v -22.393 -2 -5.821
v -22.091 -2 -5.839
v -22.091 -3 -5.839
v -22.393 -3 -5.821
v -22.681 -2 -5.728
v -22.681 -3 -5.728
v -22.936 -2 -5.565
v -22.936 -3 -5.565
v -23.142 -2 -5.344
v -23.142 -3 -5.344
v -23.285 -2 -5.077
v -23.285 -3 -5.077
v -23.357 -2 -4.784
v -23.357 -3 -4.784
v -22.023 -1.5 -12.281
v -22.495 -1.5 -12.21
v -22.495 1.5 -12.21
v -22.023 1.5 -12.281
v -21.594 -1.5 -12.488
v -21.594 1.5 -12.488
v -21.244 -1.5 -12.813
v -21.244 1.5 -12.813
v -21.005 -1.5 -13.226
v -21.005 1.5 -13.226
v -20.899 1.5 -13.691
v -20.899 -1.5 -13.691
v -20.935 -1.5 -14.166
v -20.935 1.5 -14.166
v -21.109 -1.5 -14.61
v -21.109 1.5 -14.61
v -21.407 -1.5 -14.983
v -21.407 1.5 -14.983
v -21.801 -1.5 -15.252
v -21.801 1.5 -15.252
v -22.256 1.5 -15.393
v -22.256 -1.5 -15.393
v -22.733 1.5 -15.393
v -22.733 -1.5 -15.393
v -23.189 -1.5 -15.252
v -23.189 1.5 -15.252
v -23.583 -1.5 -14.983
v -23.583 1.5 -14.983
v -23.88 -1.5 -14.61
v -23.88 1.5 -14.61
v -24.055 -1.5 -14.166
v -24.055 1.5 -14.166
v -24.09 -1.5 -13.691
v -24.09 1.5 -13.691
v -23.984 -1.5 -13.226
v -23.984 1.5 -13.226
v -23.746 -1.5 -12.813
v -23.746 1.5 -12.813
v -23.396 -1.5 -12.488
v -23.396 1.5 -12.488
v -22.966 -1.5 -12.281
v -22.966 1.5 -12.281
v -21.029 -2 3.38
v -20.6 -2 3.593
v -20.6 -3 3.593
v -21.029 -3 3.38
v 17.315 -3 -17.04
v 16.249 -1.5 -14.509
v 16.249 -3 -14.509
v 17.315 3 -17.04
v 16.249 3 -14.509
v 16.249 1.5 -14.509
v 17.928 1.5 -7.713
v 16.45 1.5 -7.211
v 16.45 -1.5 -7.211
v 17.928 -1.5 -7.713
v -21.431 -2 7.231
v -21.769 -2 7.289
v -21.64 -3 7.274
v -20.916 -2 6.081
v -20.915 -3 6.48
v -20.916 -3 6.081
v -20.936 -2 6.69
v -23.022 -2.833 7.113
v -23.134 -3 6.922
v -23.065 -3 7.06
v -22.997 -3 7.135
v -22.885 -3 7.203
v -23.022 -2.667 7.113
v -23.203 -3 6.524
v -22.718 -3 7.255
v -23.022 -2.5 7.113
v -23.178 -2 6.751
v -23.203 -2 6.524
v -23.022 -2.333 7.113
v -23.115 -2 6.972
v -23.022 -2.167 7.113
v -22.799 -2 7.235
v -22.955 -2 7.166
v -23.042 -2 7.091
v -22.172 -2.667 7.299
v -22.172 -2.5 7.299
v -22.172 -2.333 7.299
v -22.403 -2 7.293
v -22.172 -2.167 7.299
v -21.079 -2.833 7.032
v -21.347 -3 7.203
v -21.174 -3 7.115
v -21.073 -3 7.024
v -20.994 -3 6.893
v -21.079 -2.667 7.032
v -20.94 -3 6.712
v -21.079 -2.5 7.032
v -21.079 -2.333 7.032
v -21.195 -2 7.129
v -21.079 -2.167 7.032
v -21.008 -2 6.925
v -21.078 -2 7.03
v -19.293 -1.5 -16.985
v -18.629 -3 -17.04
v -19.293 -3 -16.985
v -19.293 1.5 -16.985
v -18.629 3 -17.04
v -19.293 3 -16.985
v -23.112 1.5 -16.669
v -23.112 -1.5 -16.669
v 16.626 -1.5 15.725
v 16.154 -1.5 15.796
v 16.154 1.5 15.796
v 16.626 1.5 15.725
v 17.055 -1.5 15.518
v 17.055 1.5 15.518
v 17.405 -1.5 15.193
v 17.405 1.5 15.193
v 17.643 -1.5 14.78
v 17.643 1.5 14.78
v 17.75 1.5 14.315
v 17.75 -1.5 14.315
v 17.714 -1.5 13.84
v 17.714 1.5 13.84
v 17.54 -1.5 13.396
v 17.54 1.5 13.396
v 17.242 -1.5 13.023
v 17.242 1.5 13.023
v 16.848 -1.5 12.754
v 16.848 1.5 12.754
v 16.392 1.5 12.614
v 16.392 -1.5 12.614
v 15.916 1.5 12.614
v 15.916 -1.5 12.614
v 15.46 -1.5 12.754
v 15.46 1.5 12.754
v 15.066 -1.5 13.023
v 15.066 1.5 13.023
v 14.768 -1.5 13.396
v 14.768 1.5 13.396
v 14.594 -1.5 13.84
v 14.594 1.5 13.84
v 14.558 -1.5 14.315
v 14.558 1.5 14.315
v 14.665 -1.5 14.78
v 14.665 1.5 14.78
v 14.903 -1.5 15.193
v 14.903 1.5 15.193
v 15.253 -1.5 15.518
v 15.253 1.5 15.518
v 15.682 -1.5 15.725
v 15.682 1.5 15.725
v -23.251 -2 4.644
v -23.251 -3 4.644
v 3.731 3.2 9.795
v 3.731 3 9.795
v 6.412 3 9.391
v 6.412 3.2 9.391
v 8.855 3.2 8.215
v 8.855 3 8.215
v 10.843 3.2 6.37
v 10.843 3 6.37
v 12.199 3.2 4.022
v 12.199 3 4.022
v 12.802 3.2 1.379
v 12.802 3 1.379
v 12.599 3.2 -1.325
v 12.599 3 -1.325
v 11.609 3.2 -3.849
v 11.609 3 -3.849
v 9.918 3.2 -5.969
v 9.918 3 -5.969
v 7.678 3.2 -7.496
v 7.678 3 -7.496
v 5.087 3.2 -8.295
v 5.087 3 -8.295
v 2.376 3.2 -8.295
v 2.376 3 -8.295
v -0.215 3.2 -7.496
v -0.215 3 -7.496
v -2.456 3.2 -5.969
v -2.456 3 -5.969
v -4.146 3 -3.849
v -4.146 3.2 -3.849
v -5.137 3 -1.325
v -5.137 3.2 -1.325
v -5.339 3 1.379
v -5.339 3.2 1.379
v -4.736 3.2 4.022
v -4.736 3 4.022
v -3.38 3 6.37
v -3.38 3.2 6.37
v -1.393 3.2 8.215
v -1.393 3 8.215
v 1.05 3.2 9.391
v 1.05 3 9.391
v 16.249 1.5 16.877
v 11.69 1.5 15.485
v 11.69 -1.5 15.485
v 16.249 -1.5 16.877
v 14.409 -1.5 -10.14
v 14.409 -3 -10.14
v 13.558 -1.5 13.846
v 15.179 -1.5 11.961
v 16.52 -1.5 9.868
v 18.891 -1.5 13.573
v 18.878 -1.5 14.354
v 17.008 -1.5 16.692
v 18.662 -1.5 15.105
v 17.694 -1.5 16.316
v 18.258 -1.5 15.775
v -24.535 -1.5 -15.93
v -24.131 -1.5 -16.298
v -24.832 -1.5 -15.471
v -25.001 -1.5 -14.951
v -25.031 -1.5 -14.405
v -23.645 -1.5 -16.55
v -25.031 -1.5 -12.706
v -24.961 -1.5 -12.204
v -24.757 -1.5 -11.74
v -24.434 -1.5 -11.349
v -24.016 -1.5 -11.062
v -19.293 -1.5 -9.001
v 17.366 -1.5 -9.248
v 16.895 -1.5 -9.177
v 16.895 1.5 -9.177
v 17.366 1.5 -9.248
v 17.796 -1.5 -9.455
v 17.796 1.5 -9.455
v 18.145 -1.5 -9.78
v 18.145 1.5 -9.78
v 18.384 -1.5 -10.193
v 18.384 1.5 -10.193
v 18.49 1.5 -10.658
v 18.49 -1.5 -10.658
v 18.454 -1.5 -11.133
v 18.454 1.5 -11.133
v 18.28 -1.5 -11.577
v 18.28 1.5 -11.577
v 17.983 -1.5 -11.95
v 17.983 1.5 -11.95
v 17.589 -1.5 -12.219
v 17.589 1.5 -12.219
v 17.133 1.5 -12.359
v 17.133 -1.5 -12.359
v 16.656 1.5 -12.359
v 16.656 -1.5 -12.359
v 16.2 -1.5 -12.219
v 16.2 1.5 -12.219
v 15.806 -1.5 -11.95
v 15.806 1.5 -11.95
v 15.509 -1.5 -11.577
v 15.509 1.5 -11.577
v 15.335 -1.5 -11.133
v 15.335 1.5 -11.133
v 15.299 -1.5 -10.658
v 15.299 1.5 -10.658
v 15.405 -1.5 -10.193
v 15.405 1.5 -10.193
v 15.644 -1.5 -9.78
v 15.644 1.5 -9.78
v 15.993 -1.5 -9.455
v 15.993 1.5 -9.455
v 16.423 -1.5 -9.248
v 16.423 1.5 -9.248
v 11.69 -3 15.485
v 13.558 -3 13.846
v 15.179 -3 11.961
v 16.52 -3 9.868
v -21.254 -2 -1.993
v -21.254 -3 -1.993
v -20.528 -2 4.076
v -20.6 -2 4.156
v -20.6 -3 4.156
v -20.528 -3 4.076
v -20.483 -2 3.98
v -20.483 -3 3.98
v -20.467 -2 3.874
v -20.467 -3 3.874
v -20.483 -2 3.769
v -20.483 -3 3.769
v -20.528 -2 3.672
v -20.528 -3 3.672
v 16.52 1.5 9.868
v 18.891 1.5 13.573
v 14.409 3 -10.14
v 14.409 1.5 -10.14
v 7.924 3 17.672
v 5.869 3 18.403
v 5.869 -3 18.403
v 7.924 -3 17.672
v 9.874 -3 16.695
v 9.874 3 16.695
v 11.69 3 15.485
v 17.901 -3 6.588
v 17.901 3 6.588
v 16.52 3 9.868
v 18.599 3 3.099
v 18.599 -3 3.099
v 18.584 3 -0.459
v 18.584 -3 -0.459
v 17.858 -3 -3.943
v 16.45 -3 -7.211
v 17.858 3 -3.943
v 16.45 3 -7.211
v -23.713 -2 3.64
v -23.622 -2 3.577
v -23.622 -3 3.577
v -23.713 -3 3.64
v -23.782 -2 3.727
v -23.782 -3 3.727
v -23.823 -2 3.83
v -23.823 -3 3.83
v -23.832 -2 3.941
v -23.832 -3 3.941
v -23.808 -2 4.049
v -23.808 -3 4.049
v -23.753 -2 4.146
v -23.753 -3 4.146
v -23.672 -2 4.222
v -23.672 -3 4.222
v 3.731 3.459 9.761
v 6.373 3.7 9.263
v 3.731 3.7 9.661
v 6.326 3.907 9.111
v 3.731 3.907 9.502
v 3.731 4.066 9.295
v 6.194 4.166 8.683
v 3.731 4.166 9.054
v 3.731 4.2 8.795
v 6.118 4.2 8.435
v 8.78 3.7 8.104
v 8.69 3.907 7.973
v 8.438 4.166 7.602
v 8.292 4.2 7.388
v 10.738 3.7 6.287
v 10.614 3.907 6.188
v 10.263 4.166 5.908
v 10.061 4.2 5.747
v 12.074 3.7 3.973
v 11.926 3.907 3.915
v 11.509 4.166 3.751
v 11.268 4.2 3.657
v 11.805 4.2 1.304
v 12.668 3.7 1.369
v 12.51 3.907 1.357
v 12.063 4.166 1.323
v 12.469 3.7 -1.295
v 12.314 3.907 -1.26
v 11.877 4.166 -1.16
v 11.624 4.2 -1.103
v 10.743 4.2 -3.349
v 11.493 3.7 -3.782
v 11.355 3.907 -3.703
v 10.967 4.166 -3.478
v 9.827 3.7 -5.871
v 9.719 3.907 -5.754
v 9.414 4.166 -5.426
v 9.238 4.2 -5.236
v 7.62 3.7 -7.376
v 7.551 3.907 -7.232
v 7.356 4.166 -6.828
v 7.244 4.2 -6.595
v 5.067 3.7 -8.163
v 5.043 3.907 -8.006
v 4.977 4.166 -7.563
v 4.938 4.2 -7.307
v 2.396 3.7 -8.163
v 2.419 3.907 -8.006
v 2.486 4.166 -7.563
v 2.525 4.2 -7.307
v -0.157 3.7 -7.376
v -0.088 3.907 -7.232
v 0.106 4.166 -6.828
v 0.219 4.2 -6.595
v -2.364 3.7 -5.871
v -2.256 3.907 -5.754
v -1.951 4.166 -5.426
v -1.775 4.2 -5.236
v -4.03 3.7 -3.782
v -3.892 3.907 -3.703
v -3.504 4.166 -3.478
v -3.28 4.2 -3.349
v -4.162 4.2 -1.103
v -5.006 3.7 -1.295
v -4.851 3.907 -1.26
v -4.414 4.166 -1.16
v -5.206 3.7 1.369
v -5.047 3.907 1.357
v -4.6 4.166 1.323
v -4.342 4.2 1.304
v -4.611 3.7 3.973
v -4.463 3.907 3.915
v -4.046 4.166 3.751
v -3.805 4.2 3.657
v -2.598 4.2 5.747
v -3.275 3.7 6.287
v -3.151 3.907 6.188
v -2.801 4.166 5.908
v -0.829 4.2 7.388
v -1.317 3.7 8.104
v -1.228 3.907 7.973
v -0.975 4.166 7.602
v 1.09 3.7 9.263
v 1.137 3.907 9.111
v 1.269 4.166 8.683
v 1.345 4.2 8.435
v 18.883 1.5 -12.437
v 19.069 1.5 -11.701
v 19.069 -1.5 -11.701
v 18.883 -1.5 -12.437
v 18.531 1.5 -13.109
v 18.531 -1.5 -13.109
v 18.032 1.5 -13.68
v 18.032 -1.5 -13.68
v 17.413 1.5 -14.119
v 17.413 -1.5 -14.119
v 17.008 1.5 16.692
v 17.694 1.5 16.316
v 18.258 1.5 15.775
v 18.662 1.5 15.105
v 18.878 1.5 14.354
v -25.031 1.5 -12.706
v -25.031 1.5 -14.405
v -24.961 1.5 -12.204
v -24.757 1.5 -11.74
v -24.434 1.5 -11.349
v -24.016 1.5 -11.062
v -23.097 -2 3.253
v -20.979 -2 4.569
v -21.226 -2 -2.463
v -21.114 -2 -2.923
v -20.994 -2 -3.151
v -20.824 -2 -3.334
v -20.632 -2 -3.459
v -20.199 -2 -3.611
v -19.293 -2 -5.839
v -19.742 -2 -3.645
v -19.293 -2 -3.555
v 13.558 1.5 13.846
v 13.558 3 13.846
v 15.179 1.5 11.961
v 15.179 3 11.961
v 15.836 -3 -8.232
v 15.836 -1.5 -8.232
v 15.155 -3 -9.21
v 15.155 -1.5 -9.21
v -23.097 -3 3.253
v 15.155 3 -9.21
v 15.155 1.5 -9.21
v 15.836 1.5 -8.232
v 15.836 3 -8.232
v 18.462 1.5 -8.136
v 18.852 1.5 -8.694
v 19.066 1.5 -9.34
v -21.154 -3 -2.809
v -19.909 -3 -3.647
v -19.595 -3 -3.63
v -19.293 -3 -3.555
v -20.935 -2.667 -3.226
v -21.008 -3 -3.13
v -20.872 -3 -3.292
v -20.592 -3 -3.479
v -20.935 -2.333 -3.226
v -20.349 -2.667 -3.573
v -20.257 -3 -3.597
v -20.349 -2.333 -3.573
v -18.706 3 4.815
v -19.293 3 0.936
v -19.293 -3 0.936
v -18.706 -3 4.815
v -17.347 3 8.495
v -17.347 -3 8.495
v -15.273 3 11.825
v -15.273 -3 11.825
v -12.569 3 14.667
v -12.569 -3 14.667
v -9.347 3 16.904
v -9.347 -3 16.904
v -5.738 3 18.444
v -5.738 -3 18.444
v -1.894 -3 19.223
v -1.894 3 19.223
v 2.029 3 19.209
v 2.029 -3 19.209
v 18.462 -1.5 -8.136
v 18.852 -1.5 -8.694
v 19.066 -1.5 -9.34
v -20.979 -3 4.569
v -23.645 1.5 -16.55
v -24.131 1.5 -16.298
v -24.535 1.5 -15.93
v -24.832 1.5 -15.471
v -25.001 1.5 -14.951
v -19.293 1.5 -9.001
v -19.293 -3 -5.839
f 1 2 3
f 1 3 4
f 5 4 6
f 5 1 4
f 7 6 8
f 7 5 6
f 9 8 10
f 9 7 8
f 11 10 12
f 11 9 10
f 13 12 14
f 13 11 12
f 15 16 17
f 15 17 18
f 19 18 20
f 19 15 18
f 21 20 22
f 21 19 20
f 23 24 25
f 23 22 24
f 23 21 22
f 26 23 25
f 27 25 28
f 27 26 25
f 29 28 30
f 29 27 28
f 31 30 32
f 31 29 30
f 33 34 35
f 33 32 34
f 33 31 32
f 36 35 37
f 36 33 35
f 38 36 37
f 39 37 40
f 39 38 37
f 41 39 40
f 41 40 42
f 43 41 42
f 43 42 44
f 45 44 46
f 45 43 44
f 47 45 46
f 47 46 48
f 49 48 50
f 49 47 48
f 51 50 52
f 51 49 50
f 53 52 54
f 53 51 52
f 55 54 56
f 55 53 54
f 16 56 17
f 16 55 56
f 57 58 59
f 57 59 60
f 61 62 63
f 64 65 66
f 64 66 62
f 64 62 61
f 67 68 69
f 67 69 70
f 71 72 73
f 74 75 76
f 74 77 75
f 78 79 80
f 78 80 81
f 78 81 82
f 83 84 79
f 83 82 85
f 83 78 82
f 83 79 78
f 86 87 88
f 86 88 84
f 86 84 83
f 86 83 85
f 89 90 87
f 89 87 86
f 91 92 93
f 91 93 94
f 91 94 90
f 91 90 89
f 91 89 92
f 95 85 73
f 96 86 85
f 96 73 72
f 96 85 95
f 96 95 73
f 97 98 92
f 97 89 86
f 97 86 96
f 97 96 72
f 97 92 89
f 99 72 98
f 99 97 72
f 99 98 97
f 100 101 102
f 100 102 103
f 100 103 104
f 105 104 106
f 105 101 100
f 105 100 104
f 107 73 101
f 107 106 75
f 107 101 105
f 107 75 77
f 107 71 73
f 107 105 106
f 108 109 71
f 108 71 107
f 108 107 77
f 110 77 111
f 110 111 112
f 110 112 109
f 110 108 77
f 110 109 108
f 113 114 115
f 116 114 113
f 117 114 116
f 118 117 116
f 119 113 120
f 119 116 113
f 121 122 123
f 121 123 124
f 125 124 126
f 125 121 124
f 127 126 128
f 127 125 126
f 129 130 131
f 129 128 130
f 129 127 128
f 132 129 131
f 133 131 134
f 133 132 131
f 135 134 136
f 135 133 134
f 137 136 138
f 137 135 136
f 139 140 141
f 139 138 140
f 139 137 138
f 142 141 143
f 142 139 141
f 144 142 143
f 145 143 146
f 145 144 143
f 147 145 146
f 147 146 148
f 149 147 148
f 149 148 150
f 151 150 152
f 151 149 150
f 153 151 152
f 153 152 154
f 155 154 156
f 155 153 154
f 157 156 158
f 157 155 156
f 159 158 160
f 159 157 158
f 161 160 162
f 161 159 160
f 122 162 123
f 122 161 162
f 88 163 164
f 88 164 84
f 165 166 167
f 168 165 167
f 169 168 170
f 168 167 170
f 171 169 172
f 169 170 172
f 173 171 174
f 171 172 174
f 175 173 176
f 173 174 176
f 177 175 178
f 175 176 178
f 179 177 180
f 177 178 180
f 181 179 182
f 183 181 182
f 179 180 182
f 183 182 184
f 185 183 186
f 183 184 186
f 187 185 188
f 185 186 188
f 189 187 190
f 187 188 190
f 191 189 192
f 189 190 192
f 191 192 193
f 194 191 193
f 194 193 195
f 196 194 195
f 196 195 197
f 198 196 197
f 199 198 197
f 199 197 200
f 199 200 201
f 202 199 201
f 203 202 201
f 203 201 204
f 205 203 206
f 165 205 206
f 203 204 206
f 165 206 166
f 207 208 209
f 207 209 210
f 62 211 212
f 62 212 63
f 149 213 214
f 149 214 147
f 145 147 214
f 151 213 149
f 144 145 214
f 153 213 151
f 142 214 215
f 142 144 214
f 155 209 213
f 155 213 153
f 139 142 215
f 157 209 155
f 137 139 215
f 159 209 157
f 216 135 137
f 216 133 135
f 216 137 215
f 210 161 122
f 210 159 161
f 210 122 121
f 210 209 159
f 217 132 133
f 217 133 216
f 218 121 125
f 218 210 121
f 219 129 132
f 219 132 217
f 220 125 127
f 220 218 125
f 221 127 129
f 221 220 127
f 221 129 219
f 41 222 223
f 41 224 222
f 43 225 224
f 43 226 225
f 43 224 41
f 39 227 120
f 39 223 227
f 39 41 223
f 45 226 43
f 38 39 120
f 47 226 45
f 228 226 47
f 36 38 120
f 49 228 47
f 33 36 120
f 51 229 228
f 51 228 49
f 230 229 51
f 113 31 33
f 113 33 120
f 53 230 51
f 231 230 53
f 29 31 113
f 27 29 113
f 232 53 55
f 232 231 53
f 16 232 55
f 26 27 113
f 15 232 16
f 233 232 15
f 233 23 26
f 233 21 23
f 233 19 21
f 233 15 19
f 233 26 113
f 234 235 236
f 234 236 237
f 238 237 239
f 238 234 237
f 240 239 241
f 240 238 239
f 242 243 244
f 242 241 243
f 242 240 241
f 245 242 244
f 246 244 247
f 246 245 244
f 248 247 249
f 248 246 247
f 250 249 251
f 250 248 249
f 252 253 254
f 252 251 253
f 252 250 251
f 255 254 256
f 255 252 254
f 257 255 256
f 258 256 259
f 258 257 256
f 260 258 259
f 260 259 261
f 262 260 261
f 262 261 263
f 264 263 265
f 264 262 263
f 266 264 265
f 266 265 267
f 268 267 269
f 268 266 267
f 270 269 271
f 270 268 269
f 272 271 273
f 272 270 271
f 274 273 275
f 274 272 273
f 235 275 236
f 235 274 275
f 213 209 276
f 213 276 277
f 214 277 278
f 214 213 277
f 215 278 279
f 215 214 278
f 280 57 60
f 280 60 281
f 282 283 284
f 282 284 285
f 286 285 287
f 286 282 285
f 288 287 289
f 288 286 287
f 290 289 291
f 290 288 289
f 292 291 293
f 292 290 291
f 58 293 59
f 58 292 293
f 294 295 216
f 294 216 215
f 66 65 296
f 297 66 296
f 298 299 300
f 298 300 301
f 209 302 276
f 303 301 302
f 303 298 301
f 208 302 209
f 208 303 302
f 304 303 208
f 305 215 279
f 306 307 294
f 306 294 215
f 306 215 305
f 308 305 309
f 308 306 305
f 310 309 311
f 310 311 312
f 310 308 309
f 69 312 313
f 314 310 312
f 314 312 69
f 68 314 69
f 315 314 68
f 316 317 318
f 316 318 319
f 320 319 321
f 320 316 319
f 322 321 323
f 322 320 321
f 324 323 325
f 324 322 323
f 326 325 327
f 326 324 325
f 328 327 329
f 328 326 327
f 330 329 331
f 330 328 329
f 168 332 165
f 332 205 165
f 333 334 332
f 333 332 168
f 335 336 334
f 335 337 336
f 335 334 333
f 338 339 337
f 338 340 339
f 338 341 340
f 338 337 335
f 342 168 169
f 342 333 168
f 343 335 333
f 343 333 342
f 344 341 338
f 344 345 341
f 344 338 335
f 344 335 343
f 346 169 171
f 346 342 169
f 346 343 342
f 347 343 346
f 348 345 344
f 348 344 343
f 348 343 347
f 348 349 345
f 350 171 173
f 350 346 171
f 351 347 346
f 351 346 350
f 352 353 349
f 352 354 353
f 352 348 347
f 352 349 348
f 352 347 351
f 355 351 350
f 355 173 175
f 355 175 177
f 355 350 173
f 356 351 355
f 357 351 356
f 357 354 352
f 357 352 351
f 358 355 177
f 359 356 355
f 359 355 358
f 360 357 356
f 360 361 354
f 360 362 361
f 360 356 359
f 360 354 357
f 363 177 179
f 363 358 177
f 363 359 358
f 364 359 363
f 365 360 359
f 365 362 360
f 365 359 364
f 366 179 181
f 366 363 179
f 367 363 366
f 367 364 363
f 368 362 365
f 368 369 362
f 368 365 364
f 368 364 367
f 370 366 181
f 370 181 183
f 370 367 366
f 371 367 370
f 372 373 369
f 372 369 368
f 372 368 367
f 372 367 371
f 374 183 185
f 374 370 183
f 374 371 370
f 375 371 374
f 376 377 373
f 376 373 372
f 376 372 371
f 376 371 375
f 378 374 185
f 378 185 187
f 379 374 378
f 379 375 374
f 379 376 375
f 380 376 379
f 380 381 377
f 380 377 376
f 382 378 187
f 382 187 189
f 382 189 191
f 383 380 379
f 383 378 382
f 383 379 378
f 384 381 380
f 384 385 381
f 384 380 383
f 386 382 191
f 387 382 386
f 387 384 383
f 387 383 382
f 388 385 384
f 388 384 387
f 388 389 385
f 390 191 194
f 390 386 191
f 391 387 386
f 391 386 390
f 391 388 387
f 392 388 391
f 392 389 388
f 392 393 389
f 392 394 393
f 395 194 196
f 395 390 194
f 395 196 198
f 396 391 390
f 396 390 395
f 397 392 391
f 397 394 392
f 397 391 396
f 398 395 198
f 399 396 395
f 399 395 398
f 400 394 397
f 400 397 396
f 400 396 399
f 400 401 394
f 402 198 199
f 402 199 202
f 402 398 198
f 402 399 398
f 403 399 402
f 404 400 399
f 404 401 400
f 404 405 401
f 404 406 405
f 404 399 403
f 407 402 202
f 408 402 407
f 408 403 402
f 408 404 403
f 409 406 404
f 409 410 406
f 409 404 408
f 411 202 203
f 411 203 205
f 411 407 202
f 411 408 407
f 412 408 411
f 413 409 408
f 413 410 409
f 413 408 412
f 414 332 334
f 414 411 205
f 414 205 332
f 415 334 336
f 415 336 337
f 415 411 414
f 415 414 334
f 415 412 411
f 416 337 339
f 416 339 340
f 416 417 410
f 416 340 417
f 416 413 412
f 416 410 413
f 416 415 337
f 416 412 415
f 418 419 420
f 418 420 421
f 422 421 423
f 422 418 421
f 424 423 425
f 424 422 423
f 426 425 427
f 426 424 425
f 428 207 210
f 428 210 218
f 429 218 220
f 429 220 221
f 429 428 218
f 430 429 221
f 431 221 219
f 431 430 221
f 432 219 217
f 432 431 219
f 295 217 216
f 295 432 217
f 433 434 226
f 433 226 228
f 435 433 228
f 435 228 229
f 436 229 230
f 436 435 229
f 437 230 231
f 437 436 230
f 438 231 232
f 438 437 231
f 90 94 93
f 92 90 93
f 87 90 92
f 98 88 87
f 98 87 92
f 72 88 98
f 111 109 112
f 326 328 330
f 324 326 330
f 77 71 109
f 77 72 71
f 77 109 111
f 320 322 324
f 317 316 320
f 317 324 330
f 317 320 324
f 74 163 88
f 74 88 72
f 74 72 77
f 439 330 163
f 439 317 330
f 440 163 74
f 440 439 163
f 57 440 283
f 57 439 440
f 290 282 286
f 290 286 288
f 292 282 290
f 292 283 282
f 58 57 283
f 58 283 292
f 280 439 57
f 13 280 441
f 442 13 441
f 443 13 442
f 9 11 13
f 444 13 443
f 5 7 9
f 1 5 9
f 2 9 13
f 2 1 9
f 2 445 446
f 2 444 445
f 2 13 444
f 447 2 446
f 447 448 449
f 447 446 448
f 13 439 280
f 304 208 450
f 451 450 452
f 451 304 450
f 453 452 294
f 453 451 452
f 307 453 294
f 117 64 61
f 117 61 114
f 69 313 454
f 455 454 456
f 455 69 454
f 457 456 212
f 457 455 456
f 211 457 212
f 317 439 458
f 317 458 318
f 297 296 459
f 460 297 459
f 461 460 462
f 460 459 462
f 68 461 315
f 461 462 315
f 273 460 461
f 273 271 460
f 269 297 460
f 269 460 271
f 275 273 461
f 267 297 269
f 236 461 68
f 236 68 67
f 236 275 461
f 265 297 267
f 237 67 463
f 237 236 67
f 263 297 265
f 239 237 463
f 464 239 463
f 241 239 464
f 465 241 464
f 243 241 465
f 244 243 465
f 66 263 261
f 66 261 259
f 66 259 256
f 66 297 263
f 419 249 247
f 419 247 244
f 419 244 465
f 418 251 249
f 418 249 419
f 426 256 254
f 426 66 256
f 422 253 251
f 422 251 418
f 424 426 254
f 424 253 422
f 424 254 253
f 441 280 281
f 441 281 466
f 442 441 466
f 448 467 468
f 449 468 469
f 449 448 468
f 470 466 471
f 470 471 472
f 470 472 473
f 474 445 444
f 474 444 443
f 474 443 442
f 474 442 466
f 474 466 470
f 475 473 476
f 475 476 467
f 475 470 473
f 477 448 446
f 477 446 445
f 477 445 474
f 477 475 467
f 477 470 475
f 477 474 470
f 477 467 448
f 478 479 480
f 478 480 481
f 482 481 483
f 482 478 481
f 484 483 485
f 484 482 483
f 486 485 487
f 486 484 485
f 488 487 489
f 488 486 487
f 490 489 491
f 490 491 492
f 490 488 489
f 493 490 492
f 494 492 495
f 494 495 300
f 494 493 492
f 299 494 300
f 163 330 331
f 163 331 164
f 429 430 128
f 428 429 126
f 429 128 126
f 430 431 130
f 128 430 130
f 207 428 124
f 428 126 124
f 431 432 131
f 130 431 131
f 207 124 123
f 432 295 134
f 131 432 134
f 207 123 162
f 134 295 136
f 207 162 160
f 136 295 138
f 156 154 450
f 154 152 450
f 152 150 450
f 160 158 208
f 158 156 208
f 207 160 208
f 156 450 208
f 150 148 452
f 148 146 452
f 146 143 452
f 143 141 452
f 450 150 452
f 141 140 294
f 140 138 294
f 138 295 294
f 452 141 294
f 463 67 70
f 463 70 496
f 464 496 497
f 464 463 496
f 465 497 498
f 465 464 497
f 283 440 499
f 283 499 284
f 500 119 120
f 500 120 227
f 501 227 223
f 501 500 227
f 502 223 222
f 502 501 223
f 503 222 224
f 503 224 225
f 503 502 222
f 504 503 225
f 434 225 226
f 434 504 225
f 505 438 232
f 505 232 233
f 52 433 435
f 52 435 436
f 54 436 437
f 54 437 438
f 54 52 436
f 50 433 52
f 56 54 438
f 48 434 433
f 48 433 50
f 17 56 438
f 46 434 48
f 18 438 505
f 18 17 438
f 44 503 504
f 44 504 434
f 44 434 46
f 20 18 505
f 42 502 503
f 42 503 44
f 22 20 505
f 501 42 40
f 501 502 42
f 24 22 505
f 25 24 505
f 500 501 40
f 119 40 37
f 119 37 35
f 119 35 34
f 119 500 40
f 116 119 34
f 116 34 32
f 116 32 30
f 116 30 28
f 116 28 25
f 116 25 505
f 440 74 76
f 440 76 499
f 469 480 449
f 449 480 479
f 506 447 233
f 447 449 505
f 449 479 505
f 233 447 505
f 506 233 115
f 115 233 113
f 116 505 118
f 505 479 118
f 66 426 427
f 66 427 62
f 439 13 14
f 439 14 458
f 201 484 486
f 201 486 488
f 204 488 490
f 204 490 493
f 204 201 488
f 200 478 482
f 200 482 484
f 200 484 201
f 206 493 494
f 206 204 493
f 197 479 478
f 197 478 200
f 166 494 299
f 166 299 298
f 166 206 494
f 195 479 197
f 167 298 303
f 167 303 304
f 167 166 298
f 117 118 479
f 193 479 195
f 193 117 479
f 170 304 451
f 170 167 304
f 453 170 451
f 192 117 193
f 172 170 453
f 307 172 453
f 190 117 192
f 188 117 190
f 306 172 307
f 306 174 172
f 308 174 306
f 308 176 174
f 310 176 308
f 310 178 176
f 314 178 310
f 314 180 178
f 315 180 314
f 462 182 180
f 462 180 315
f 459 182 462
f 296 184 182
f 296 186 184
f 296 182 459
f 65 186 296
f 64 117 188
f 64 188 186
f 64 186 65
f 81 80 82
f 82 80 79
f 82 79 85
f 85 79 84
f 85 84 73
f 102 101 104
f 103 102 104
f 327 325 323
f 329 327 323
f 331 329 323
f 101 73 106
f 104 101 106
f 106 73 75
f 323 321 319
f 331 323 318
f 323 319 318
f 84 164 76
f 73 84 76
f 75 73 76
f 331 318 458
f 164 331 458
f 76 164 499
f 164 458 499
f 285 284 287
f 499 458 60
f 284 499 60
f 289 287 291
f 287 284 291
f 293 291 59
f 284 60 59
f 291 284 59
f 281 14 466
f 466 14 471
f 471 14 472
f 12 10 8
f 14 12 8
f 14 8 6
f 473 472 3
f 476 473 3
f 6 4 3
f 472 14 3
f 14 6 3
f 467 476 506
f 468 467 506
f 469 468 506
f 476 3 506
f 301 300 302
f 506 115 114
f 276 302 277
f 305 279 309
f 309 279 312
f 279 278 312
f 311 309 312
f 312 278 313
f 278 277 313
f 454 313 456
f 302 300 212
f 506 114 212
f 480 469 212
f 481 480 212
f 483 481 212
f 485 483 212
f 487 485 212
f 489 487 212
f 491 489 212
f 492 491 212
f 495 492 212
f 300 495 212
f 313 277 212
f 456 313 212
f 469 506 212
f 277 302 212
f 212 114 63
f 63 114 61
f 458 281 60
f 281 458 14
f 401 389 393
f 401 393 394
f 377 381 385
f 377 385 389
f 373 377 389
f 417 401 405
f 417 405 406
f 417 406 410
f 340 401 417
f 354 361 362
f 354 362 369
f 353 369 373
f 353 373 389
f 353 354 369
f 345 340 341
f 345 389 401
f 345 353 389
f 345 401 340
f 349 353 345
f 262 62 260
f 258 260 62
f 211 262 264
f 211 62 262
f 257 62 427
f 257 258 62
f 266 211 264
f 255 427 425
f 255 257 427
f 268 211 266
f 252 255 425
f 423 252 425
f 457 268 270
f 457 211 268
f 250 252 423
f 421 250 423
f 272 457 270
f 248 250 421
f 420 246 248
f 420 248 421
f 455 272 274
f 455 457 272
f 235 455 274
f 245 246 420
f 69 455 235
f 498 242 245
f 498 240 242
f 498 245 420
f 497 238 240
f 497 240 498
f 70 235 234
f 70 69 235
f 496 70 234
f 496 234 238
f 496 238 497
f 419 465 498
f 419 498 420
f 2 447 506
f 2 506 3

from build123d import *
from build123d.topology import SkipClean

# Parameters (mm, degrees)
SKETCH2_R           = 1.5
BOSS_EXTRUDE1_DEPTH = 3
SKETCH3_R           = 9.096048505
BOSS_EXTRUDE2_DEPTH = 1.2
FILLET1_R           = 1
CUT_EXTRUDE1_DEPTH  = 1.5
CUT_EXTRUDE2_START  = -1.5
CUT_EXTRUDE2_DEPTH  = 1.5
CUT_EXTRUDE3_DEPTH  = 5
MOVE_FACE1_BY       = 0.1
MOVE_FACE1_2_BY     = 0.1
MOVE_FACE1_3_BY     = 0.1


with BuildPart() as part:
    # Sketch2 → Boss-Extrude1 (new, symmetric)
    with BuildSketch(Plane(origin=(0, 0, 0), x_dir=(1, 0, 0), z_dir=(0, 1, 0))):
        with BuildLine():
            Line((-20.599560655, -3.593123858), (-21.028912901, -3.379903546))
            Line((-21.028912901, -3.379903546), (-21.254187526, 1.993220784))
            add(Edge.make_bspline(
                [(-21.254187526, 1.993220784), (-21.250081776, 2.377226096), (-21.195139063, 3.186038357), (-20.237966675, 3.678013728), (-19.626306607, 3.674971934), (-19.293061526, 3.554683236)],
                knots=[0.008573336, 0.008573336, 0.008573336, 0.008573336, 0.425411643, 0.645508579, 0.988655727, 0.988655727, 0.988655727, 0.988655727], degree=3))
            Line((-19.293061526, 3.554683236), (-19.293061526, -0.935875279))
            ThreePointArc((-19.293061526, -0.935875279), (-11.01478007, -15.867347151), (5.868677769, -18.402627716))
            ThreePointArc((5.868677769, -18.402627716), (8.914480471, -17.213611271), (11.689585214, -15.484603502))
            Line((11.689585214, -15.484603502), (16.248961374, -16.876941699))
            ThreePointArc((16.248961374, -16.876941699), (18.257558766, -15.774505508), (18.891422269, -13.572677609))
            Line((18.891422269, -13.572677609), (16.51986009, -9.867884272))
            ThreePointArc((16.51986009, -9.867884272), (18.681381592, -1.319406436), (16.449996012, 7.211101574))
            Line((16.449996012, 7.211101574), (17.928084104, 7.713187831))
            ThreePointArc((17.928084104, 7.713187831), (18.677006581, 8.400562387), (19.066466062, 9.339545863))
            Line((19.066466062, 9.339545863), (19.069212644, 11.701301235))
            ThreePointArc((19.069212644, 11.701301235), (18.53112158, 13.108816633), (17.413375201, 14.119402908))
            Line((17.413375201, 14.119402908), (16.248961374, 14.508827059))
            Line((16.248961374, 14.508827059), (17.314988377, 17.040275234))
            Line((17.314988377, 17.040275234), (-18.629227908, 17.040275234))
            Line((-18.629227908, 17.040275234), (-23.111573489, 16.669208858))
            ThreePointArc((-23.111573489, 16.669208858), (-24.534989581, 15.930034001), (-25.030823978, 14.404700893))
            Line((-25.030823978, 14.404700893), (-25.030823978, 12.70560175))
            ThreePointArc((-25.030823978, 12.70560175), (-24.756748057, 11.739888101), (-24.016241086, 11.062119787))
            Line((-24.016241086, 11.062119787), (-19.293061526, 9.00102042))
            Line((-19.293061526, 9.00102042), (-19.293061526, 5.839179653))
            Line((-19.293061526, 5.839179653), (-22.090684207, 5.839179653))
            ThreePointArc((-22.090684207, 5.839179653), (-22.935760928, 5.565442119), (-23.357392581, 4.783576625))
            Line((-23.357392581, 4.783576625), (-23.096619876, -3.253456456))
            Line((-23.096619876, -3.253456456), (-23.621531964, -3.576891157))
            ThreePointArc((-23.621531964, -3.576891157), (-23.831523214, -3.884927944), (-23.671952518, -4.221855504))
            Line((-23.671952518, -4.221855504), (-23.25143386, -4.644287186))
            Line((-23.25143386, -4.644287186), (-23.202937263, -6.523606801))
            add(Edge.make_bspline(
                [(-23.202937263, -6.523606801), (-23.190415125, -6.701394879), (-23.14585211, -7.158039831), (-22.604610265, -7.291644066), (-22.131088375, -7.301130698), (-21.611573501, -7.301182592), (-20.850084131, -7.060004854), (-20.915185829, -6.352757768), (-20.915665013, -6.081028816)],
                knots=[0, 0, 0, 0, 0.172348306, 0.293808545, 0.415161147, 0.571057182, 0.730620463, 1, 1, 1, 1], degree=3))
            Line((-20.915665013, -6.081028816), (-20.979073646, -4.568641575))
            Line((-20.979073646, -4.568641575), (-20.599560655, -4.155522335))
            ThreePointArc((-20.599560655, -4.155522335), (-20.467265038, -3.874323097), (-20.599560655, -3.593123858))
        make_face()
        with Locations(Location((16.153998691, -14.195749789, 0), (0, 0, 270))):
            Circle(SKETCH2_R, mode=Mode.SUBTRACT)
        with Locations(Location((-22.494848615, 13.810394624, 0), (0, 0, 270))):
            Circle(SKETCH2_R, mode=Mode.SUBTRACT)
        with Locations(Location((16.894563054, 10.777137226, 0), (0, 0, 270))):
            Circle(SKETCH2_R, mode=Mode.SUBTRACT)
    extrude(amount=BOSS_EXTRUDE1_DEPTH, both=True)

    # Sketch3 → Boss-Extrude2 (add)
    with BuildSketch(Plane(origin=(0, 3, 0), x_dir=(1, 0, 0), z_dir=(0, 1, 0))):
        with Locations(Location((3.73137128, -0.69899531, 0), (0, 0, 270))):
            Circle(SKETCH3_R)
    extrude(amount=BOSS_EXTRUDE2_DEPTH)

    # Fillet1
    fillet1_edges = [part.edges().sort_by_distance(p)[0] for p in [
        (3.73137128, 4.2, -8.397053195),
    ]]
    fillet(fillet1_edges, radius=FILLET1_R)

    # Sketch4 → Cut-Extrude1 (cut)
    with SkipClean():  # the faces are left unmerged after this step: merging them gives an invalid solid
        with BuildSketch(Plane(origin=(0, 3, 0), x_dir=(1, 0, 0), z_dir=(0, 1, 0))):
            Polygon((-19.293061526, 7.248655358), (-19.293061526, 22.083159944), (-29.904114882, 22.083159944), (-28.79317924, 8.663465276), align=None)
            with BuildLine():
                Line((17.65280475, 17.842473148), (14.40910217, 10.139793056))
                ThreePointArc((14.40910217, 10.139793056), (16.735981963, 6.675507155), (18.187015276, 2.762688645))
                Line((18.187015276, 2.762688645), (25.347732491, 2.045186791))
                Line((25.347732491, 2.045186791), (30.175625625, 15.043360613))
                Line((30.175625625, 15.043360613), (17.65280475, 17.842473148))
            make_face()
            with BuildLine():
                Line((17.279847396, -8.294754226), (24.575782686, -15.276129443))
                Line((24.575782686, -15.276129443), (17.279847396, -23.8721919))
                Line((17.279847396, -23.8721919), (10.670432719, -16.203678062))
                ThreePointArc((10.670432719, -16.203678062), (14.563628552, -12.741010549), (17.279847396, -8.294754226))
            make_face()
        extrude(amount=-CUT_EXTRUDE1_DEPTH, mode=Mode.SUBTRACT)

    # Sketch5 → Cut-Extrude2 (cut)
    with SkipClean():  # the faces are left unmerged after this step: merging them gives an invalid solid
        with BuildSketch(Plane.XZ.offset(3).offset(CUT_EXTRUDE2_START)):
            with BuildLine():
                Line((14.40910217, -10.139793056), (17.65280475, -17.842473148))
                Line((17.65280475, -17.842473148), (30.175625625, -15.043360613))
                Line((30.175625625, -15.043360613), (25.347732491, -2.045186791))
                Line((25.347732491, -2.045186791), (18.187015276, -2.762688645))
                ThreePointArc((18.187015276, -2.762688645), (16.735981963, -6.675507155), (14.40910217, -10.139793056))
            make_face()
            Polygon((-19.293061526, -22.083159944), (-19.293061526, -7.248655358), (-28.79317924, -8.663465276), (-29.904114882, -22.083159944), align=None)
            with BuildLine():
                Line((24.575782686, 15.276129443), (17.279847396, 23.8721919))
                Line((17.279847396, 23.8721919), (10.670432719, 16.203678062))
                ThreePointArc((10.670432719, 16.203678062), (14.563628552, 12.741010549), (17.279847396, 8.294754226))
                Line((17.279847396, 8.294754226), (24.575782686, 15.276129443))
            make_face()
        extrude(amount=CUT_EXTRUDE2_DEPTH, mode=Mode.SUBTRACT)

    # Sketch6 → Cut-Extrude3 (cut)
    with SkipClean():  # the faces are left unmerged after this step: merging them gives an invalid solid
        with BuildSketch(Plane(origin=(0, 3, 0), x_dir=(1, 0, 0), z_dir=(0, 1, 0))):
            Polygon((-19.293061526, -0.935875279), (-19.293061526, 7.436034842), (-28.419835781, 7.111305906), (-26.742069614, -11.668850866), (-19.293061526, -11.003377521), align=None)
        extrude(amount=-CUT_EXTRUDE3_DEPTH, mode=Mode.SUBTRACT)

    # Move Face1: a curved face moved inward by 0.1
    add(Solid.thicken(part.faces().sort_by_distance((16.153998691, 0, 12.695749789))[0], -MOVE_FACE1_BY), mode=Mode.SUBTRACT)

    # Move Face1 2: a curved face moved inward by 0.1
    add(Solid.thicken(part.faces().sort_by_distance((-22.494848615, 0, -15.310394624))[0], -MOVE_FACE1_2_BY), mode=Mode.SUBTRACT)

    # Move Face1 3: a curved face moved inward by 0.1
    add(Solid.thicken(part.faces().sort_by_distance((16.894563054, 0, -12.277137226))[0], -MOVE_FACE1_3_BY), mode=Mode.SUBTRACT)


solid = part.part
